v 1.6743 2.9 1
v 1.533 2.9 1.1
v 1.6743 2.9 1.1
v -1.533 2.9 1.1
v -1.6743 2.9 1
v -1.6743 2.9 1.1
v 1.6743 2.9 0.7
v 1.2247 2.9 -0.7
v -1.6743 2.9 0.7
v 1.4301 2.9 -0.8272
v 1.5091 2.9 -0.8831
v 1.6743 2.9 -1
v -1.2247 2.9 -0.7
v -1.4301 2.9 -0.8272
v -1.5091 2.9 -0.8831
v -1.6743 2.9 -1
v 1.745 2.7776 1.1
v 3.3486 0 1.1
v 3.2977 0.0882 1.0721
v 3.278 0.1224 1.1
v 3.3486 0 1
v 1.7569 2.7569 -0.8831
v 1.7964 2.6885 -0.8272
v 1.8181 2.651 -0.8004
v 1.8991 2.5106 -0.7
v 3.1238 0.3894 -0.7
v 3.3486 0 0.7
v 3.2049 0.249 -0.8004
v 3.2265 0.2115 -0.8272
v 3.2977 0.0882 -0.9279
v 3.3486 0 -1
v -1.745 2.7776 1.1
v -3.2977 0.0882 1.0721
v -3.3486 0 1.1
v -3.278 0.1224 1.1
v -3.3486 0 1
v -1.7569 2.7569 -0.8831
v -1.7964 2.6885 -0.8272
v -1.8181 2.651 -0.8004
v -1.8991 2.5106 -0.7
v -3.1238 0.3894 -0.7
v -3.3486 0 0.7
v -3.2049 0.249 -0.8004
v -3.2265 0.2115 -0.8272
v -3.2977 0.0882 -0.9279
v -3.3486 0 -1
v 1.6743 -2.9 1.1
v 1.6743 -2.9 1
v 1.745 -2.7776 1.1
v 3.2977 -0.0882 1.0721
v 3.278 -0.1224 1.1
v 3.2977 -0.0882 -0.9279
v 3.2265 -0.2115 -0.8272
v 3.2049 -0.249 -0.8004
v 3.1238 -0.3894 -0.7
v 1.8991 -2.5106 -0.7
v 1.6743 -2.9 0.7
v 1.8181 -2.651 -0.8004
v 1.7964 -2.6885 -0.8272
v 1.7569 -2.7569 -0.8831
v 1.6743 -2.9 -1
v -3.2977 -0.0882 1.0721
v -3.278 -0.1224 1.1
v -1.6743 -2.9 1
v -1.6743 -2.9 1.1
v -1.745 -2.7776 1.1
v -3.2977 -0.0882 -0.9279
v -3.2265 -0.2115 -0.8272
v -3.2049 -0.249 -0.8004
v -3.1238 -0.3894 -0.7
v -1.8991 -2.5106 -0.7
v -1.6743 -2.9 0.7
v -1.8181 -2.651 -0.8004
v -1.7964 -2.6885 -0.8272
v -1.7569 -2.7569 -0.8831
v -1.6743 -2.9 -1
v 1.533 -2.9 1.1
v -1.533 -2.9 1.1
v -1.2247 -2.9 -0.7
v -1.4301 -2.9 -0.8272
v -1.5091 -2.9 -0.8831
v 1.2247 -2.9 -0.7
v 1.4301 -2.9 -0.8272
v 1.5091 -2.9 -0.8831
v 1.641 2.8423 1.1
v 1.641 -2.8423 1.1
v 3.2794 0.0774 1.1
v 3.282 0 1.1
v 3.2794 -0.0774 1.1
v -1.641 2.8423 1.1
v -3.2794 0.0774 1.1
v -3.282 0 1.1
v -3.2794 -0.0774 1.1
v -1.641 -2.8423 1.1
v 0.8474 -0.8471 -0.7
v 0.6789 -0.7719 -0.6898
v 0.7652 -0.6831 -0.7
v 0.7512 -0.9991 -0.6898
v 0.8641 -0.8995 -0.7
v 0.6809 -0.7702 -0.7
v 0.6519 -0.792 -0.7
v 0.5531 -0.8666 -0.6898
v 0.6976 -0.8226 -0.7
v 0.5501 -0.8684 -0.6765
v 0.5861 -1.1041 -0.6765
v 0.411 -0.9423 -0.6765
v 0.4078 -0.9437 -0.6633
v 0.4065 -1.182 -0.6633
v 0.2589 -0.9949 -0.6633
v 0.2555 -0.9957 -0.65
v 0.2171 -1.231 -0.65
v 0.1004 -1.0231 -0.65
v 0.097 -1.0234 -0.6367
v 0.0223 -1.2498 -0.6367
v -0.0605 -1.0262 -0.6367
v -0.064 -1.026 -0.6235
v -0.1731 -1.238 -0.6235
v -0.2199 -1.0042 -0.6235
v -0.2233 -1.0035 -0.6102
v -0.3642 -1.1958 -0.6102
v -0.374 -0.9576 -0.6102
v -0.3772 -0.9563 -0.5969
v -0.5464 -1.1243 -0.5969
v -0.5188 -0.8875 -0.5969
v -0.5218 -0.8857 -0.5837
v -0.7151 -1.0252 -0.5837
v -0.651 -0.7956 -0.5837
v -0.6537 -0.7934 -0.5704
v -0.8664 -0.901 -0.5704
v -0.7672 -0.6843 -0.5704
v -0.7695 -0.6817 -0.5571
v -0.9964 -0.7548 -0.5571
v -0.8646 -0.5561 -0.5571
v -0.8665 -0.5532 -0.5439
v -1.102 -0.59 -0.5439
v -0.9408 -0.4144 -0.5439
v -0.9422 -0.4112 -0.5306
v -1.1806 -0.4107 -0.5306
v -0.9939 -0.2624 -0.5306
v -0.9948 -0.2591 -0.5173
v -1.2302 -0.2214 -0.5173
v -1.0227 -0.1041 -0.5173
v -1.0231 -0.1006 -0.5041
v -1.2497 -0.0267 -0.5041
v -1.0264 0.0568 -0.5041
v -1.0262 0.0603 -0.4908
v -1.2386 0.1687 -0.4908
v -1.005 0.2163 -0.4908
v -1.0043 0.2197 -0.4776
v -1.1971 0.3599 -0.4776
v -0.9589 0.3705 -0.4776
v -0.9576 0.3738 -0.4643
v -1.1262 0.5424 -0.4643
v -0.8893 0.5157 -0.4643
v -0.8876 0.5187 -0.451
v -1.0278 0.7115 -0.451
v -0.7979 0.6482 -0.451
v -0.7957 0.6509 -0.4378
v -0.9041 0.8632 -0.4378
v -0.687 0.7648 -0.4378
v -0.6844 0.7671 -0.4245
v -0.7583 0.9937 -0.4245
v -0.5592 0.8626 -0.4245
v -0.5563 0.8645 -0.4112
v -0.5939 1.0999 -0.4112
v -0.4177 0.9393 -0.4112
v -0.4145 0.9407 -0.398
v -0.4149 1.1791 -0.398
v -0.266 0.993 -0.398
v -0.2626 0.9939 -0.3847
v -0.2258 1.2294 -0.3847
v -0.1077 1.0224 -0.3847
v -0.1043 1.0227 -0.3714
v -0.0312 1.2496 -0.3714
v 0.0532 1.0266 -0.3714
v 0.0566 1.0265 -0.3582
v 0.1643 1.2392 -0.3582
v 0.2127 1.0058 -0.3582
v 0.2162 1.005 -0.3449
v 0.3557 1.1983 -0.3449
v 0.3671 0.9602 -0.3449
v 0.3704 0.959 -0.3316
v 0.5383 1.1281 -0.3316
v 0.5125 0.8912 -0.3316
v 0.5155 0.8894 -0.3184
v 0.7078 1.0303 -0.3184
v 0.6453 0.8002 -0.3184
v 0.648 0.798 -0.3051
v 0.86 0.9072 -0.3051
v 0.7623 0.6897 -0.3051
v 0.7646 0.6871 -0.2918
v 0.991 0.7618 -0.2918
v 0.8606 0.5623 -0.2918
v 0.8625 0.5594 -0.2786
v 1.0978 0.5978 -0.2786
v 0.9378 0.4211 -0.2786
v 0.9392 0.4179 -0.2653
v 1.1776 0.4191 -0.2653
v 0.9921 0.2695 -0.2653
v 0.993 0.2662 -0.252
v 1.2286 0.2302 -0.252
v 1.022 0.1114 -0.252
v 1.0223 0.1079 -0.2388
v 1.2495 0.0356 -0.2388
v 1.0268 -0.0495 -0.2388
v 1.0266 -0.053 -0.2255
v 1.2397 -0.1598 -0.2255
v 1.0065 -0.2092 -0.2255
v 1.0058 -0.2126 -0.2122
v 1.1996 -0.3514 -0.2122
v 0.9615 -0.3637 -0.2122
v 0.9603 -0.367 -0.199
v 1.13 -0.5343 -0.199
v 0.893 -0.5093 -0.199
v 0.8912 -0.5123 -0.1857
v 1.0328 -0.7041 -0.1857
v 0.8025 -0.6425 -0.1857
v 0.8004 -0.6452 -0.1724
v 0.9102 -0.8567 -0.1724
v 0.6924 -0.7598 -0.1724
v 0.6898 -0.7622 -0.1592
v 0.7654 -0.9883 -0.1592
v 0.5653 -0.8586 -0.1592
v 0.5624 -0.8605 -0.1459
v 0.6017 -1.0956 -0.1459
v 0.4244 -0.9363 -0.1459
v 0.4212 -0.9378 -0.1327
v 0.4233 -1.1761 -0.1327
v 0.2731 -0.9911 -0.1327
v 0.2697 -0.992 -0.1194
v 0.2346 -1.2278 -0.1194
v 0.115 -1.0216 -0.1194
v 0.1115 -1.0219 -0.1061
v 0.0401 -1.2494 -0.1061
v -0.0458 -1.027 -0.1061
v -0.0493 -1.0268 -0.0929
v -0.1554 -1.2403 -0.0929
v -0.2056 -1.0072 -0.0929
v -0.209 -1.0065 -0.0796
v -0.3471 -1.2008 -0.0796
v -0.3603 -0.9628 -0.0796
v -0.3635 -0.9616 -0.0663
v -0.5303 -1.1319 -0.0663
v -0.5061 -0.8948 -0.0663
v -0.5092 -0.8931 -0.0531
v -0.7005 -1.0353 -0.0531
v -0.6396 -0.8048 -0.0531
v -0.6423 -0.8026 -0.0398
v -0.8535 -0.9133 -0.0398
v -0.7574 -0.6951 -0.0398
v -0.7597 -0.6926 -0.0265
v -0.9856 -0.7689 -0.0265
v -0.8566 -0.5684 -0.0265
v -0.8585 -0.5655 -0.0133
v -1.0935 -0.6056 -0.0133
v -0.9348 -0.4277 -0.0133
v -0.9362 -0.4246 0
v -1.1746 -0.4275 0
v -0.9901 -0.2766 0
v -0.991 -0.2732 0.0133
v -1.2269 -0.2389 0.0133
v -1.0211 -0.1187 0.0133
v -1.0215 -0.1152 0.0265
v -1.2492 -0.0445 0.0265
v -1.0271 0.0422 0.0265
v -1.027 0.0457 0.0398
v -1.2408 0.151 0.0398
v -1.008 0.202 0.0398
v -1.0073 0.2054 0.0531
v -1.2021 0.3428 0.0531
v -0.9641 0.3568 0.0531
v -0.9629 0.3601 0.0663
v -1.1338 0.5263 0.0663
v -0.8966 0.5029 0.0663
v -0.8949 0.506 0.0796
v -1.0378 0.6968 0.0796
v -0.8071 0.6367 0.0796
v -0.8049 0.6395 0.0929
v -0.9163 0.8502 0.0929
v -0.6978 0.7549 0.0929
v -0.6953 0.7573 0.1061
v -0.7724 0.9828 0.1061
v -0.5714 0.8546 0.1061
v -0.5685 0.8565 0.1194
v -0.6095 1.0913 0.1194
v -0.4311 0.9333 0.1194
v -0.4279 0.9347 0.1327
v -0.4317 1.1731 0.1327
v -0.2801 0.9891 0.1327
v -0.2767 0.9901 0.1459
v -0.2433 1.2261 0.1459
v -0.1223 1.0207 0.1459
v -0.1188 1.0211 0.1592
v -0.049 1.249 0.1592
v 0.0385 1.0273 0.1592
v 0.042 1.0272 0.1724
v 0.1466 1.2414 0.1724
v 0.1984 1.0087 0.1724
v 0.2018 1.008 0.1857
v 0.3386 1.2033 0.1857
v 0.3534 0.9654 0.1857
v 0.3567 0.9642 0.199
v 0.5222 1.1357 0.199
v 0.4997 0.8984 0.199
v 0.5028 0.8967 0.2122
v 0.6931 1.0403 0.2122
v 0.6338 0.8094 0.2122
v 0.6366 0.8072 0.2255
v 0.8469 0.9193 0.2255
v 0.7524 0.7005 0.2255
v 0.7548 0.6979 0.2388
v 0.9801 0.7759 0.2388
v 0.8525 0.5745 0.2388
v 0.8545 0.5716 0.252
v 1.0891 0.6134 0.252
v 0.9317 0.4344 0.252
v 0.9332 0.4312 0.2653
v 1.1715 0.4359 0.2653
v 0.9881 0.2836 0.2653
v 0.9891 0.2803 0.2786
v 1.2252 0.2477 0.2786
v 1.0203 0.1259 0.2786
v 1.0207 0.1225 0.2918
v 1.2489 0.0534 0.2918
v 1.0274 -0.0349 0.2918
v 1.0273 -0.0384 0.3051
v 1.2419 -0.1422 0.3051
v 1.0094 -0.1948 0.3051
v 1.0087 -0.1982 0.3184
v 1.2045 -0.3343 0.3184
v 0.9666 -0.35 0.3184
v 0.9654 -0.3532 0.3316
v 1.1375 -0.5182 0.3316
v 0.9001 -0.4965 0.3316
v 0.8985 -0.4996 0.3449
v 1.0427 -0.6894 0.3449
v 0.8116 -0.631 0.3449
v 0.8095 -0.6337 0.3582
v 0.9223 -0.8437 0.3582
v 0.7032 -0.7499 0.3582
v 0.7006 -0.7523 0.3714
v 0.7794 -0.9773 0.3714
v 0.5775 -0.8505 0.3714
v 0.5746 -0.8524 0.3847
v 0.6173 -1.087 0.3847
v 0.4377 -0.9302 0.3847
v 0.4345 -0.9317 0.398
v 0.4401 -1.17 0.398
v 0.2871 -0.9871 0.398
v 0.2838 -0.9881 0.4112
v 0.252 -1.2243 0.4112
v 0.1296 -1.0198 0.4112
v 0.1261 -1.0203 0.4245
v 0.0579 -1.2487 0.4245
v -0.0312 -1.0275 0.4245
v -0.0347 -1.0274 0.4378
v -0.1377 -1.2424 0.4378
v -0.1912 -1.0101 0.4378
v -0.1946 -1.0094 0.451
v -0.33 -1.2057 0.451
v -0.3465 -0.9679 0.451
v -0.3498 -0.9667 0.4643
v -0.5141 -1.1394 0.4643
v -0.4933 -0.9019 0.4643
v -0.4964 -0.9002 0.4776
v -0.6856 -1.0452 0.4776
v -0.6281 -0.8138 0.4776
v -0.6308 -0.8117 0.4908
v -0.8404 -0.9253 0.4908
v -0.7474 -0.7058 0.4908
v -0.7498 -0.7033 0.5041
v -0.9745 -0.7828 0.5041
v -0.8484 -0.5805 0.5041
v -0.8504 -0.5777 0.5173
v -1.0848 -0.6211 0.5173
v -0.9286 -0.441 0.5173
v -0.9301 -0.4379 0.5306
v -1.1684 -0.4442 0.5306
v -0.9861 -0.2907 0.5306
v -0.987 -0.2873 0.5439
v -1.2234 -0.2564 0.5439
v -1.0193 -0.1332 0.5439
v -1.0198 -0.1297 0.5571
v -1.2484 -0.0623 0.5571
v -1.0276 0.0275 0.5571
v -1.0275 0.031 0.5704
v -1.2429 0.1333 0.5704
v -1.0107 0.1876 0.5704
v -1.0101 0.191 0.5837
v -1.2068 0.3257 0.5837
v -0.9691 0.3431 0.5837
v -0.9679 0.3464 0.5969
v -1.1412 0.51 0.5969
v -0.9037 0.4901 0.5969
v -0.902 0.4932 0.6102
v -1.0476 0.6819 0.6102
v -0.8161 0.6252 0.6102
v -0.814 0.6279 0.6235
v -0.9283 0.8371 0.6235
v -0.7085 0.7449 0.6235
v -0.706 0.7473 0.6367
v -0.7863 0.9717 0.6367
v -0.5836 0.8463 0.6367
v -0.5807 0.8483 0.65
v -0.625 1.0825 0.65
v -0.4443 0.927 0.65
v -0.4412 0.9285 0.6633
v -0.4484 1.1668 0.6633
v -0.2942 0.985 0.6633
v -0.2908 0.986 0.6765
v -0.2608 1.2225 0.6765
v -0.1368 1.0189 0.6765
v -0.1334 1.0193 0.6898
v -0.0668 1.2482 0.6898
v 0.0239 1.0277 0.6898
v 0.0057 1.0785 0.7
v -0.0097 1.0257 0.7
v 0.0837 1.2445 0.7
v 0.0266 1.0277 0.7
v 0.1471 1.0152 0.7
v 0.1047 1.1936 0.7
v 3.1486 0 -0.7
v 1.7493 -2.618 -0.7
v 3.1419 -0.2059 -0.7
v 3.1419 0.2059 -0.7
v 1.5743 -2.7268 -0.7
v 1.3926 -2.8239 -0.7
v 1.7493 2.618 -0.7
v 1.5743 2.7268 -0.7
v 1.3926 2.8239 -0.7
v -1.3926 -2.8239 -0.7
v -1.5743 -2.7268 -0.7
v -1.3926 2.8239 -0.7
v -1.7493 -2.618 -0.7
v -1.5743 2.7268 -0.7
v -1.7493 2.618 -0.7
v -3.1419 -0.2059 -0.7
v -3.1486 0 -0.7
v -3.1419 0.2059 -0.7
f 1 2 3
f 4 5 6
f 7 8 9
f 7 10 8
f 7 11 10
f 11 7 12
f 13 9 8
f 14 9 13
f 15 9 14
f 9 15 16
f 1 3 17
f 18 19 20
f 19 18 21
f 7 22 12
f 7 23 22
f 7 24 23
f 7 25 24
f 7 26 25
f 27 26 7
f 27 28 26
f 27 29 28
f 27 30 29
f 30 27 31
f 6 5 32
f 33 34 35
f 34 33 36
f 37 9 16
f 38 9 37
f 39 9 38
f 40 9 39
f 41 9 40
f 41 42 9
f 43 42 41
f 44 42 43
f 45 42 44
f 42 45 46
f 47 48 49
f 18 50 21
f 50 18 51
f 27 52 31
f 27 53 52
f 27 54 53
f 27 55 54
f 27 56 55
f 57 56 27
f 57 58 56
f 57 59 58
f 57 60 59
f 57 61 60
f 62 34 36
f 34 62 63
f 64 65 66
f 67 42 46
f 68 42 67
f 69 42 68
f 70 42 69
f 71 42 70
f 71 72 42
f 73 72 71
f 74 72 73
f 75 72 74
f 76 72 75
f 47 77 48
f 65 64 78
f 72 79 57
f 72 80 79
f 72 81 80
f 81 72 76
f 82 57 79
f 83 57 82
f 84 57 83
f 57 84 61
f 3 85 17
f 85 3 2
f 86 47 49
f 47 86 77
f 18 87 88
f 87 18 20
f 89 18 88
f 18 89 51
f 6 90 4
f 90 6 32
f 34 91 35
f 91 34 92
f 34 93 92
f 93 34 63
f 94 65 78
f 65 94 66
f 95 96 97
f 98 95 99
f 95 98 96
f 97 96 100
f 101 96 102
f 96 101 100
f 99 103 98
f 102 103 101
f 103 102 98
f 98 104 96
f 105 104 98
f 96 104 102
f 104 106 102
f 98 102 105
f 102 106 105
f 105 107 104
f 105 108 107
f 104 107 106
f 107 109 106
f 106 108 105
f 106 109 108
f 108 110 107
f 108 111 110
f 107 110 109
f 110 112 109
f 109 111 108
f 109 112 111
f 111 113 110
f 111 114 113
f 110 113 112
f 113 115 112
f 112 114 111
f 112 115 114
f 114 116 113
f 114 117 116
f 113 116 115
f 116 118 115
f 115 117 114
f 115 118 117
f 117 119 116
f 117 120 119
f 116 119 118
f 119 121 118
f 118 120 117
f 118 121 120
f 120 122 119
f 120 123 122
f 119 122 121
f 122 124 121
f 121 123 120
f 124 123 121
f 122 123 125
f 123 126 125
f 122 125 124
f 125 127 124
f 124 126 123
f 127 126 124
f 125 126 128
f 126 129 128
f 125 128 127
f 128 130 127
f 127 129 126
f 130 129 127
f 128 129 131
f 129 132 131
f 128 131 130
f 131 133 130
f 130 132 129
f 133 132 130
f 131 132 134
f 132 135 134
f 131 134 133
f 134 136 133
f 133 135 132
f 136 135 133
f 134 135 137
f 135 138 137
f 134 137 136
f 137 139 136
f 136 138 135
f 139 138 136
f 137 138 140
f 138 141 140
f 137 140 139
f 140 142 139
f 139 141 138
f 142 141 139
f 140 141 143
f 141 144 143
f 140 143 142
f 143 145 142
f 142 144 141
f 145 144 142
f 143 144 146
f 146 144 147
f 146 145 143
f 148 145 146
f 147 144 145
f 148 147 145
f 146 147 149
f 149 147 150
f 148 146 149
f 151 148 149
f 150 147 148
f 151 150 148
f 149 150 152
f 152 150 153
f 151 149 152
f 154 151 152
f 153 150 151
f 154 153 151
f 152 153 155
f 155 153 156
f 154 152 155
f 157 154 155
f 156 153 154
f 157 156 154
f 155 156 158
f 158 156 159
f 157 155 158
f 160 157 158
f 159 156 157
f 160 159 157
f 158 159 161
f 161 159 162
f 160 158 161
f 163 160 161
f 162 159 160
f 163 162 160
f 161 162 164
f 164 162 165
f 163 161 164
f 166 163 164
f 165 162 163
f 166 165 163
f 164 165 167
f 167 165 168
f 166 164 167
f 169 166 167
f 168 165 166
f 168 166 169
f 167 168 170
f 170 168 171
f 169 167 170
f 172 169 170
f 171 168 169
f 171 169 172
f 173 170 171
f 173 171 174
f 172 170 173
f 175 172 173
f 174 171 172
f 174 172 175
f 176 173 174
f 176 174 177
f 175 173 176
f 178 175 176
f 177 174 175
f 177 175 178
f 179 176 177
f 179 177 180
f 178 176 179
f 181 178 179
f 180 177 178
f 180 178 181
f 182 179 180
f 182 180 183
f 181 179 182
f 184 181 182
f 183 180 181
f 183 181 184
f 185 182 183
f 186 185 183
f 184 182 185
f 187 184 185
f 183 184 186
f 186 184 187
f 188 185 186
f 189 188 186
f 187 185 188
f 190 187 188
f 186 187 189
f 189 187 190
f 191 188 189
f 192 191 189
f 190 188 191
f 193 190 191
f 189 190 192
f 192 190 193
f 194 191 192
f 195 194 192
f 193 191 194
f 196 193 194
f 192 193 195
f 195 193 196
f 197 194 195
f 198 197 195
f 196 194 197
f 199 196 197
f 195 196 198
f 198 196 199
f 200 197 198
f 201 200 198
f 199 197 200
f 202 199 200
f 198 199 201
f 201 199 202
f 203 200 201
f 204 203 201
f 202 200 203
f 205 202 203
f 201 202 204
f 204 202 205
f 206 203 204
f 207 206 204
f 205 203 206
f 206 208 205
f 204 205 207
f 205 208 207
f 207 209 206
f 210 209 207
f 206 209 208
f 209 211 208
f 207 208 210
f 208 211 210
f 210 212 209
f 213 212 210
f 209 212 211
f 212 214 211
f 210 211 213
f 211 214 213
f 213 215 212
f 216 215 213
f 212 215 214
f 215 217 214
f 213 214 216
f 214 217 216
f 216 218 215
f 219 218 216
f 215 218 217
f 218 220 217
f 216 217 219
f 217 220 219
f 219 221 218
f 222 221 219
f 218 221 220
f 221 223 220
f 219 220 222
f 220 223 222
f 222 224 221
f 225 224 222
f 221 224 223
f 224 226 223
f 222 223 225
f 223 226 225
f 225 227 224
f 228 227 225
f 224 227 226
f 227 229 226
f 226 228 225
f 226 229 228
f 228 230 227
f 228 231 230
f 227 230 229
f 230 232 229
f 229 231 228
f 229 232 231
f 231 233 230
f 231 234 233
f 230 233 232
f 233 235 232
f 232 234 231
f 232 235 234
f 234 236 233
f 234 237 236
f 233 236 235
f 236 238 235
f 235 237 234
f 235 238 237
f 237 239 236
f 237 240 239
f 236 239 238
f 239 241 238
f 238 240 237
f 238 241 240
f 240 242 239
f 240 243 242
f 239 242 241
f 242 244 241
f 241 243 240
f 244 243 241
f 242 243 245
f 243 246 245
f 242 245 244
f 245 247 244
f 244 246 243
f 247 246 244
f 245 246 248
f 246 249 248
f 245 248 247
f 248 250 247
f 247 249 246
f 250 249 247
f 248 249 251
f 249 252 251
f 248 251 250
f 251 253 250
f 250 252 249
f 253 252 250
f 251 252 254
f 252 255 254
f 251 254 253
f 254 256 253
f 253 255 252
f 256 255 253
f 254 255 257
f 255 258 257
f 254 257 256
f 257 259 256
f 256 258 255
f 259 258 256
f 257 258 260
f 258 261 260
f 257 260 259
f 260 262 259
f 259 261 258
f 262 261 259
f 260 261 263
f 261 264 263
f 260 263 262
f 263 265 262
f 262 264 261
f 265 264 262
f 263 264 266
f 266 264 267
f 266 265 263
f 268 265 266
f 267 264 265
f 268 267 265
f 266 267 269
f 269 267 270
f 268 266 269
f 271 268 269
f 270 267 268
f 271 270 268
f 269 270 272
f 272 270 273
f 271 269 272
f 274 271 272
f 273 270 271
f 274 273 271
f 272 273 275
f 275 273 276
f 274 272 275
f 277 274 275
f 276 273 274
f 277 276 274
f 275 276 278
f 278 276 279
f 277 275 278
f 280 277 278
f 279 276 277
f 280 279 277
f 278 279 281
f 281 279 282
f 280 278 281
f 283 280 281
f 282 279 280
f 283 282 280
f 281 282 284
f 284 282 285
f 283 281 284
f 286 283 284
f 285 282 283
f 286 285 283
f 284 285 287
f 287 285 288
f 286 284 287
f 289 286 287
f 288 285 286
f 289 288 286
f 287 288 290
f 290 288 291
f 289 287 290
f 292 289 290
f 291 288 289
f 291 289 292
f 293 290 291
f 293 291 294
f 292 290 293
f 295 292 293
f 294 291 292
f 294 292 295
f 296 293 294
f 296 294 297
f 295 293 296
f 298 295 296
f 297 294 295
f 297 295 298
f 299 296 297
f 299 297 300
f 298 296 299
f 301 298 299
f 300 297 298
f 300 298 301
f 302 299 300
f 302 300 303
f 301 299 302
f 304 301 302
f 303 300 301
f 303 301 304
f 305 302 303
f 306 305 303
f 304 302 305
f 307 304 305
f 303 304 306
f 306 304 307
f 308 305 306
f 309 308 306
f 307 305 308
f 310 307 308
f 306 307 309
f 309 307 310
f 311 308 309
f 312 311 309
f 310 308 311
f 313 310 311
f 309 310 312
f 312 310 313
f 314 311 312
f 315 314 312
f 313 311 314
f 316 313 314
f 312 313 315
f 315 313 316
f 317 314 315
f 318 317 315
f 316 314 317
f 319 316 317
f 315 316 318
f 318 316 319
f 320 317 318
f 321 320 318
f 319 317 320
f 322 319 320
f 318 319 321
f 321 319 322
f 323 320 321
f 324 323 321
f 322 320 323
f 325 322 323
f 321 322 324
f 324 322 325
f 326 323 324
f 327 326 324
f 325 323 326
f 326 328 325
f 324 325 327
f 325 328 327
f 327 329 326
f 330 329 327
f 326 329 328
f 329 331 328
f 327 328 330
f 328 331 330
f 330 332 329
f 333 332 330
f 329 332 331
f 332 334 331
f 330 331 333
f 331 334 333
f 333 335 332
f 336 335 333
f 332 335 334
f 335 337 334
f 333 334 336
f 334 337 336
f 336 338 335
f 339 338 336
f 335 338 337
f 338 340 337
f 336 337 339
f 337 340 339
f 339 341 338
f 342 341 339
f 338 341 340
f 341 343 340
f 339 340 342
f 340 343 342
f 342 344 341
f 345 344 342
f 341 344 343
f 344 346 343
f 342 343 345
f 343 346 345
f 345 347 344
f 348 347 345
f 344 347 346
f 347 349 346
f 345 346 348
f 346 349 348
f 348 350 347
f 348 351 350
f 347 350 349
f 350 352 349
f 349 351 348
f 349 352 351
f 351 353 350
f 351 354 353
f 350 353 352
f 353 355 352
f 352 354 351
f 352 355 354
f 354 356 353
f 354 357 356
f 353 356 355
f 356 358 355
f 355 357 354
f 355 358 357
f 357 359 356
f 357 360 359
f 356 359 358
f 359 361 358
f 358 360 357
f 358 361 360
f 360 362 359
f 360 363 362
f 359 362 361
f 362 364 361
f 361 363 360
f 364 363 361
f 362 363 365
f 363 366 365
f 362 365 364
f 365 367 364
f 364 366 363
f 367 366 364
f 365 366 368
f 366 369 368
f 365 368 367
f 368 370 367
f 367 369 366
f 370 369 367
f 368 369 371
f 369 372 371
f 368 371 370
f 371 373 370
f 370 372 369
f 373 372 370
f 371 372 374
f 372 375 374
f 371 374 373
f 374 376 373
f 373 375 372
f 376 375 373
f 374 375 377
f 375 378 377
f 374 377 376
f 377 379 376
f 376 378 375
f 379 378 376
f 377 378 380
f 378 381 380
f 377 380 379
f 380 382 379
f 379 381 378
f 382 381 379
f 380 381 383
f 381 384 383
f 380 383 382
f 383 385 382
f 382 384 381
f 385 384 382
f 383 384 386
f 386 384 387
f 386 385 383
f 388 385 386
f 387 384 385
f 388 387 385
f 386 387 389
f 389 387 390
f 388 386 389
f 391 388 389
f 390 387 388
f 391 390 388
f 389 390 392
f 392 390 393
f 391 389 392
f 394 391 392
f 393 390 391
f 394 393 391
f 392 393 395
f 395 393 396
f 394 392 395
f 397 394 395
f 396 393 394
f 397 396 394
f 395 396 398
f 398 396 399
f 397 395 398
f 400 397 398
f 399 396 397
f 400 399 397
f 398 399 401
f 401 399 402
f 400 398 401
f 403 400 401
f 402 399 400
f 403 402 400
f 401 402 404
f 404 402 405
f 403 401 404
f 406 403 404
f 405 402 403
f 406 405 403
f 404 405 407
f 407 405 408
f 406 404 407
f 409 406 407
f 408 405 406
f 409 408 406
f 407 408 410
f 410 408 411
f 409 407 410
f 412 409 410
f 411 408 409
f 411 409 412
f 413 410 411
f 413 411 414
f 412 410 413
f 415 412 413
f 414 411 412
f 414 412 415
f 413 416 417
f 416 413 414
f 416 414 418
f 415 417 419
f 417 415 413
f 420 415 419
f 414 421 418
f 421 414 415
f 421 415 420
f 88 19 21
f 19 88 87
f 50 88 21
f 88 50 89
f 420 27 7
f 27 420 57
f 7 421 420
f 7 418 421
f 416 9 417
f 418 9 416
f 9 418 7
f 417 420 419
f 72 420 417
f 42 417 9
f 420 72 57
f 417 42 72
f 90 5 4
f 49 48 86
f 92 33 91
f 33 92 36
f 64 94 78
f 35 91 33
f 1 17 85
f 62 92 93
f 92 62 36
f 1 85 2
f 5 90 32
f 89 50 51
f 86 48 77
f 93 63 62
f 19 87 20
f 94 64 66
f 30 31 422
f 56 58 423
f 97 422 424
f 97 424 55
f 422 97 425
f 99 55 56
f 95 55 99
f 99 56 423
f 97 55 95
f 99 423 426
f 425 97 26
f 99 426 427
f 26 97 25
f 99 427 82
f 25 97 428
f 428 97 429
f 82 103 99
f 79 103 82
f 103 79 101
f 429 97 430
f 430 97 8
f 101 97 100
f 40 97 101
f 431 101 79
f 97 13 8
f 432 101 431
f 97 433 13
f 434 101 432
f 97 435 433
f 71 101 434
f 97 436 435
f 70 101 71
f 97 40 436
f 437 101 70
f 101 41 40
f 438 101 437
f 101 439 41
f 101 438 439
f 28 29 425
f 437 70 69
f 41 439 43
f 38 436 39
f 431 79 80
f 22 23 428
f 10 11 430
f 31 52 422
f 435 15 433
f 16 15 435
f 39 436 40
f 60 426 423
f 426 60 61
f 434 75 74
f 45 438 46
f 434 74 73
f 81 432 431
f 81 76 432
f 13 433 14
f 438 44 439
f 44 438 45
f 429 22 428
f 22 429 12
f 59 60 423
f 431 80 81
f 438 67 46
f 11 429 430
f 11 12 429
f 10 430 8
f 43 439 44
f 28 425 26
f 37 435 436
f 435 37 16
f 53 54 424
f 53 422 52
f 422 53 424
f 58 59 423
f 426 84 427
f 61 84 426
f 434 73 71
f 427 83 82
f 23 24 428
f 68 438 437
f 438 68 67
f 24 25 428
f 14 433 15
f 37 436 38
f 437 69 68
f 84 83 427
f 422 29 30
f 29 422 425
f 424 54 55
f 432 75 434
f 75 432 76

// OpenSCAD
// Hex nut: M2.5, 5.8mm across flats, 2.2mm thick
// One connected solid, no face bumps/markings, with internal thread approximation.

$fn = 96;

// --- Parameters (mm) ---
nut_af      = 5.8;     // across flats
nut_thk     = 2.2;     // thickness

// M2.5 coarse thread (approx)
thread_pitch = 0.45;   // mm
major_d      = 2.5;    // nominal major diameter
minor_d      = 2.05;   // approximate minor diameter for internal thread

// Edge chamfer (small, typical)
chamfer      = 0.20;

// Robust boolean overlap
overlap      = 0.20;

// --- Helpers ---
function hex_R(af) = af / sqrt(3); // circumradius for a hex with given across-flats

module hex_prism(af, h) {
    linear_extrude(height=h, center=true)
        polygon(points=[
            [ hex_R(af), 0],
            [ hex_R(af)/2,  af/2],
            [-hex_R(af)/2,  af/2],
            [-hex_R(af), 0],
            [-hex_R(af)/2, -af/2],
            [ hex_R(af)/2, -af/2]
        ]);
}

// Simple internal thread approximation using linear_extrude twist.
// This is not a standards-perfect ISO profile, but it is a helical threaded void.
module internal_thread(d_major, d_minor, pitch, length) {
    turns = length / pitch;
    // Use a triangular "tooth" in 2D, extruded with twist to form a helix.
    // The triangle spans from minor radius to major radius.
    r_maj = d_major/2;
    r_min = d_minor/2;

    // Tooth thickness along Y kept small to avoid self-intersection.
    tooth_w = pitch * 0.35;

    linear_extrude(height=length + 2*overlap, center=true, twist=turns*360, slices=max(ceil(turns*40), 60))
        translate([0,0,0])
            polygon(points=[
                [r_min, -tooth_w/2],
                [r_maj,  0],
                [r_min,  tooth_w/2]
            ]);
}

// Chamfer cutter (top or bottom) as a conical frustum ring.
module chamfer_cutter(af, chamfer_h, zsign=1) {
    // Place cutter so it intersects the nut edge by chamfer_h.
    // zsign: +1 for top, -1 for bottom.
    R = hex_R(af);
    zc = zsign*(nut_thk/2 - chamfer_h/2);
    translate([0,0,zc])
        cylinder(h=chamfer_h + 2*overlap,
                 r1=R + chamfer_h,
                 r2=R - chamfer_h,
                 center=true);
}

// --- Final nut ---
module hex_nut_M25() {
    difference() {
        // Body
        hex_prism(nut_af, nut_thk);

        // Internal thread void (helical)
        internal_thread(major_d, minor_d, thread_pitch, nut_thk);

        // Small entry chamfers on both faces (typical nut lead-in)
        chamfer_cutter(nut_af, chamfer,  1);
        chamfer_cutter(nut_af, chamfer, -1);
    }
}

color("DimGray") hex_nut_M25();
